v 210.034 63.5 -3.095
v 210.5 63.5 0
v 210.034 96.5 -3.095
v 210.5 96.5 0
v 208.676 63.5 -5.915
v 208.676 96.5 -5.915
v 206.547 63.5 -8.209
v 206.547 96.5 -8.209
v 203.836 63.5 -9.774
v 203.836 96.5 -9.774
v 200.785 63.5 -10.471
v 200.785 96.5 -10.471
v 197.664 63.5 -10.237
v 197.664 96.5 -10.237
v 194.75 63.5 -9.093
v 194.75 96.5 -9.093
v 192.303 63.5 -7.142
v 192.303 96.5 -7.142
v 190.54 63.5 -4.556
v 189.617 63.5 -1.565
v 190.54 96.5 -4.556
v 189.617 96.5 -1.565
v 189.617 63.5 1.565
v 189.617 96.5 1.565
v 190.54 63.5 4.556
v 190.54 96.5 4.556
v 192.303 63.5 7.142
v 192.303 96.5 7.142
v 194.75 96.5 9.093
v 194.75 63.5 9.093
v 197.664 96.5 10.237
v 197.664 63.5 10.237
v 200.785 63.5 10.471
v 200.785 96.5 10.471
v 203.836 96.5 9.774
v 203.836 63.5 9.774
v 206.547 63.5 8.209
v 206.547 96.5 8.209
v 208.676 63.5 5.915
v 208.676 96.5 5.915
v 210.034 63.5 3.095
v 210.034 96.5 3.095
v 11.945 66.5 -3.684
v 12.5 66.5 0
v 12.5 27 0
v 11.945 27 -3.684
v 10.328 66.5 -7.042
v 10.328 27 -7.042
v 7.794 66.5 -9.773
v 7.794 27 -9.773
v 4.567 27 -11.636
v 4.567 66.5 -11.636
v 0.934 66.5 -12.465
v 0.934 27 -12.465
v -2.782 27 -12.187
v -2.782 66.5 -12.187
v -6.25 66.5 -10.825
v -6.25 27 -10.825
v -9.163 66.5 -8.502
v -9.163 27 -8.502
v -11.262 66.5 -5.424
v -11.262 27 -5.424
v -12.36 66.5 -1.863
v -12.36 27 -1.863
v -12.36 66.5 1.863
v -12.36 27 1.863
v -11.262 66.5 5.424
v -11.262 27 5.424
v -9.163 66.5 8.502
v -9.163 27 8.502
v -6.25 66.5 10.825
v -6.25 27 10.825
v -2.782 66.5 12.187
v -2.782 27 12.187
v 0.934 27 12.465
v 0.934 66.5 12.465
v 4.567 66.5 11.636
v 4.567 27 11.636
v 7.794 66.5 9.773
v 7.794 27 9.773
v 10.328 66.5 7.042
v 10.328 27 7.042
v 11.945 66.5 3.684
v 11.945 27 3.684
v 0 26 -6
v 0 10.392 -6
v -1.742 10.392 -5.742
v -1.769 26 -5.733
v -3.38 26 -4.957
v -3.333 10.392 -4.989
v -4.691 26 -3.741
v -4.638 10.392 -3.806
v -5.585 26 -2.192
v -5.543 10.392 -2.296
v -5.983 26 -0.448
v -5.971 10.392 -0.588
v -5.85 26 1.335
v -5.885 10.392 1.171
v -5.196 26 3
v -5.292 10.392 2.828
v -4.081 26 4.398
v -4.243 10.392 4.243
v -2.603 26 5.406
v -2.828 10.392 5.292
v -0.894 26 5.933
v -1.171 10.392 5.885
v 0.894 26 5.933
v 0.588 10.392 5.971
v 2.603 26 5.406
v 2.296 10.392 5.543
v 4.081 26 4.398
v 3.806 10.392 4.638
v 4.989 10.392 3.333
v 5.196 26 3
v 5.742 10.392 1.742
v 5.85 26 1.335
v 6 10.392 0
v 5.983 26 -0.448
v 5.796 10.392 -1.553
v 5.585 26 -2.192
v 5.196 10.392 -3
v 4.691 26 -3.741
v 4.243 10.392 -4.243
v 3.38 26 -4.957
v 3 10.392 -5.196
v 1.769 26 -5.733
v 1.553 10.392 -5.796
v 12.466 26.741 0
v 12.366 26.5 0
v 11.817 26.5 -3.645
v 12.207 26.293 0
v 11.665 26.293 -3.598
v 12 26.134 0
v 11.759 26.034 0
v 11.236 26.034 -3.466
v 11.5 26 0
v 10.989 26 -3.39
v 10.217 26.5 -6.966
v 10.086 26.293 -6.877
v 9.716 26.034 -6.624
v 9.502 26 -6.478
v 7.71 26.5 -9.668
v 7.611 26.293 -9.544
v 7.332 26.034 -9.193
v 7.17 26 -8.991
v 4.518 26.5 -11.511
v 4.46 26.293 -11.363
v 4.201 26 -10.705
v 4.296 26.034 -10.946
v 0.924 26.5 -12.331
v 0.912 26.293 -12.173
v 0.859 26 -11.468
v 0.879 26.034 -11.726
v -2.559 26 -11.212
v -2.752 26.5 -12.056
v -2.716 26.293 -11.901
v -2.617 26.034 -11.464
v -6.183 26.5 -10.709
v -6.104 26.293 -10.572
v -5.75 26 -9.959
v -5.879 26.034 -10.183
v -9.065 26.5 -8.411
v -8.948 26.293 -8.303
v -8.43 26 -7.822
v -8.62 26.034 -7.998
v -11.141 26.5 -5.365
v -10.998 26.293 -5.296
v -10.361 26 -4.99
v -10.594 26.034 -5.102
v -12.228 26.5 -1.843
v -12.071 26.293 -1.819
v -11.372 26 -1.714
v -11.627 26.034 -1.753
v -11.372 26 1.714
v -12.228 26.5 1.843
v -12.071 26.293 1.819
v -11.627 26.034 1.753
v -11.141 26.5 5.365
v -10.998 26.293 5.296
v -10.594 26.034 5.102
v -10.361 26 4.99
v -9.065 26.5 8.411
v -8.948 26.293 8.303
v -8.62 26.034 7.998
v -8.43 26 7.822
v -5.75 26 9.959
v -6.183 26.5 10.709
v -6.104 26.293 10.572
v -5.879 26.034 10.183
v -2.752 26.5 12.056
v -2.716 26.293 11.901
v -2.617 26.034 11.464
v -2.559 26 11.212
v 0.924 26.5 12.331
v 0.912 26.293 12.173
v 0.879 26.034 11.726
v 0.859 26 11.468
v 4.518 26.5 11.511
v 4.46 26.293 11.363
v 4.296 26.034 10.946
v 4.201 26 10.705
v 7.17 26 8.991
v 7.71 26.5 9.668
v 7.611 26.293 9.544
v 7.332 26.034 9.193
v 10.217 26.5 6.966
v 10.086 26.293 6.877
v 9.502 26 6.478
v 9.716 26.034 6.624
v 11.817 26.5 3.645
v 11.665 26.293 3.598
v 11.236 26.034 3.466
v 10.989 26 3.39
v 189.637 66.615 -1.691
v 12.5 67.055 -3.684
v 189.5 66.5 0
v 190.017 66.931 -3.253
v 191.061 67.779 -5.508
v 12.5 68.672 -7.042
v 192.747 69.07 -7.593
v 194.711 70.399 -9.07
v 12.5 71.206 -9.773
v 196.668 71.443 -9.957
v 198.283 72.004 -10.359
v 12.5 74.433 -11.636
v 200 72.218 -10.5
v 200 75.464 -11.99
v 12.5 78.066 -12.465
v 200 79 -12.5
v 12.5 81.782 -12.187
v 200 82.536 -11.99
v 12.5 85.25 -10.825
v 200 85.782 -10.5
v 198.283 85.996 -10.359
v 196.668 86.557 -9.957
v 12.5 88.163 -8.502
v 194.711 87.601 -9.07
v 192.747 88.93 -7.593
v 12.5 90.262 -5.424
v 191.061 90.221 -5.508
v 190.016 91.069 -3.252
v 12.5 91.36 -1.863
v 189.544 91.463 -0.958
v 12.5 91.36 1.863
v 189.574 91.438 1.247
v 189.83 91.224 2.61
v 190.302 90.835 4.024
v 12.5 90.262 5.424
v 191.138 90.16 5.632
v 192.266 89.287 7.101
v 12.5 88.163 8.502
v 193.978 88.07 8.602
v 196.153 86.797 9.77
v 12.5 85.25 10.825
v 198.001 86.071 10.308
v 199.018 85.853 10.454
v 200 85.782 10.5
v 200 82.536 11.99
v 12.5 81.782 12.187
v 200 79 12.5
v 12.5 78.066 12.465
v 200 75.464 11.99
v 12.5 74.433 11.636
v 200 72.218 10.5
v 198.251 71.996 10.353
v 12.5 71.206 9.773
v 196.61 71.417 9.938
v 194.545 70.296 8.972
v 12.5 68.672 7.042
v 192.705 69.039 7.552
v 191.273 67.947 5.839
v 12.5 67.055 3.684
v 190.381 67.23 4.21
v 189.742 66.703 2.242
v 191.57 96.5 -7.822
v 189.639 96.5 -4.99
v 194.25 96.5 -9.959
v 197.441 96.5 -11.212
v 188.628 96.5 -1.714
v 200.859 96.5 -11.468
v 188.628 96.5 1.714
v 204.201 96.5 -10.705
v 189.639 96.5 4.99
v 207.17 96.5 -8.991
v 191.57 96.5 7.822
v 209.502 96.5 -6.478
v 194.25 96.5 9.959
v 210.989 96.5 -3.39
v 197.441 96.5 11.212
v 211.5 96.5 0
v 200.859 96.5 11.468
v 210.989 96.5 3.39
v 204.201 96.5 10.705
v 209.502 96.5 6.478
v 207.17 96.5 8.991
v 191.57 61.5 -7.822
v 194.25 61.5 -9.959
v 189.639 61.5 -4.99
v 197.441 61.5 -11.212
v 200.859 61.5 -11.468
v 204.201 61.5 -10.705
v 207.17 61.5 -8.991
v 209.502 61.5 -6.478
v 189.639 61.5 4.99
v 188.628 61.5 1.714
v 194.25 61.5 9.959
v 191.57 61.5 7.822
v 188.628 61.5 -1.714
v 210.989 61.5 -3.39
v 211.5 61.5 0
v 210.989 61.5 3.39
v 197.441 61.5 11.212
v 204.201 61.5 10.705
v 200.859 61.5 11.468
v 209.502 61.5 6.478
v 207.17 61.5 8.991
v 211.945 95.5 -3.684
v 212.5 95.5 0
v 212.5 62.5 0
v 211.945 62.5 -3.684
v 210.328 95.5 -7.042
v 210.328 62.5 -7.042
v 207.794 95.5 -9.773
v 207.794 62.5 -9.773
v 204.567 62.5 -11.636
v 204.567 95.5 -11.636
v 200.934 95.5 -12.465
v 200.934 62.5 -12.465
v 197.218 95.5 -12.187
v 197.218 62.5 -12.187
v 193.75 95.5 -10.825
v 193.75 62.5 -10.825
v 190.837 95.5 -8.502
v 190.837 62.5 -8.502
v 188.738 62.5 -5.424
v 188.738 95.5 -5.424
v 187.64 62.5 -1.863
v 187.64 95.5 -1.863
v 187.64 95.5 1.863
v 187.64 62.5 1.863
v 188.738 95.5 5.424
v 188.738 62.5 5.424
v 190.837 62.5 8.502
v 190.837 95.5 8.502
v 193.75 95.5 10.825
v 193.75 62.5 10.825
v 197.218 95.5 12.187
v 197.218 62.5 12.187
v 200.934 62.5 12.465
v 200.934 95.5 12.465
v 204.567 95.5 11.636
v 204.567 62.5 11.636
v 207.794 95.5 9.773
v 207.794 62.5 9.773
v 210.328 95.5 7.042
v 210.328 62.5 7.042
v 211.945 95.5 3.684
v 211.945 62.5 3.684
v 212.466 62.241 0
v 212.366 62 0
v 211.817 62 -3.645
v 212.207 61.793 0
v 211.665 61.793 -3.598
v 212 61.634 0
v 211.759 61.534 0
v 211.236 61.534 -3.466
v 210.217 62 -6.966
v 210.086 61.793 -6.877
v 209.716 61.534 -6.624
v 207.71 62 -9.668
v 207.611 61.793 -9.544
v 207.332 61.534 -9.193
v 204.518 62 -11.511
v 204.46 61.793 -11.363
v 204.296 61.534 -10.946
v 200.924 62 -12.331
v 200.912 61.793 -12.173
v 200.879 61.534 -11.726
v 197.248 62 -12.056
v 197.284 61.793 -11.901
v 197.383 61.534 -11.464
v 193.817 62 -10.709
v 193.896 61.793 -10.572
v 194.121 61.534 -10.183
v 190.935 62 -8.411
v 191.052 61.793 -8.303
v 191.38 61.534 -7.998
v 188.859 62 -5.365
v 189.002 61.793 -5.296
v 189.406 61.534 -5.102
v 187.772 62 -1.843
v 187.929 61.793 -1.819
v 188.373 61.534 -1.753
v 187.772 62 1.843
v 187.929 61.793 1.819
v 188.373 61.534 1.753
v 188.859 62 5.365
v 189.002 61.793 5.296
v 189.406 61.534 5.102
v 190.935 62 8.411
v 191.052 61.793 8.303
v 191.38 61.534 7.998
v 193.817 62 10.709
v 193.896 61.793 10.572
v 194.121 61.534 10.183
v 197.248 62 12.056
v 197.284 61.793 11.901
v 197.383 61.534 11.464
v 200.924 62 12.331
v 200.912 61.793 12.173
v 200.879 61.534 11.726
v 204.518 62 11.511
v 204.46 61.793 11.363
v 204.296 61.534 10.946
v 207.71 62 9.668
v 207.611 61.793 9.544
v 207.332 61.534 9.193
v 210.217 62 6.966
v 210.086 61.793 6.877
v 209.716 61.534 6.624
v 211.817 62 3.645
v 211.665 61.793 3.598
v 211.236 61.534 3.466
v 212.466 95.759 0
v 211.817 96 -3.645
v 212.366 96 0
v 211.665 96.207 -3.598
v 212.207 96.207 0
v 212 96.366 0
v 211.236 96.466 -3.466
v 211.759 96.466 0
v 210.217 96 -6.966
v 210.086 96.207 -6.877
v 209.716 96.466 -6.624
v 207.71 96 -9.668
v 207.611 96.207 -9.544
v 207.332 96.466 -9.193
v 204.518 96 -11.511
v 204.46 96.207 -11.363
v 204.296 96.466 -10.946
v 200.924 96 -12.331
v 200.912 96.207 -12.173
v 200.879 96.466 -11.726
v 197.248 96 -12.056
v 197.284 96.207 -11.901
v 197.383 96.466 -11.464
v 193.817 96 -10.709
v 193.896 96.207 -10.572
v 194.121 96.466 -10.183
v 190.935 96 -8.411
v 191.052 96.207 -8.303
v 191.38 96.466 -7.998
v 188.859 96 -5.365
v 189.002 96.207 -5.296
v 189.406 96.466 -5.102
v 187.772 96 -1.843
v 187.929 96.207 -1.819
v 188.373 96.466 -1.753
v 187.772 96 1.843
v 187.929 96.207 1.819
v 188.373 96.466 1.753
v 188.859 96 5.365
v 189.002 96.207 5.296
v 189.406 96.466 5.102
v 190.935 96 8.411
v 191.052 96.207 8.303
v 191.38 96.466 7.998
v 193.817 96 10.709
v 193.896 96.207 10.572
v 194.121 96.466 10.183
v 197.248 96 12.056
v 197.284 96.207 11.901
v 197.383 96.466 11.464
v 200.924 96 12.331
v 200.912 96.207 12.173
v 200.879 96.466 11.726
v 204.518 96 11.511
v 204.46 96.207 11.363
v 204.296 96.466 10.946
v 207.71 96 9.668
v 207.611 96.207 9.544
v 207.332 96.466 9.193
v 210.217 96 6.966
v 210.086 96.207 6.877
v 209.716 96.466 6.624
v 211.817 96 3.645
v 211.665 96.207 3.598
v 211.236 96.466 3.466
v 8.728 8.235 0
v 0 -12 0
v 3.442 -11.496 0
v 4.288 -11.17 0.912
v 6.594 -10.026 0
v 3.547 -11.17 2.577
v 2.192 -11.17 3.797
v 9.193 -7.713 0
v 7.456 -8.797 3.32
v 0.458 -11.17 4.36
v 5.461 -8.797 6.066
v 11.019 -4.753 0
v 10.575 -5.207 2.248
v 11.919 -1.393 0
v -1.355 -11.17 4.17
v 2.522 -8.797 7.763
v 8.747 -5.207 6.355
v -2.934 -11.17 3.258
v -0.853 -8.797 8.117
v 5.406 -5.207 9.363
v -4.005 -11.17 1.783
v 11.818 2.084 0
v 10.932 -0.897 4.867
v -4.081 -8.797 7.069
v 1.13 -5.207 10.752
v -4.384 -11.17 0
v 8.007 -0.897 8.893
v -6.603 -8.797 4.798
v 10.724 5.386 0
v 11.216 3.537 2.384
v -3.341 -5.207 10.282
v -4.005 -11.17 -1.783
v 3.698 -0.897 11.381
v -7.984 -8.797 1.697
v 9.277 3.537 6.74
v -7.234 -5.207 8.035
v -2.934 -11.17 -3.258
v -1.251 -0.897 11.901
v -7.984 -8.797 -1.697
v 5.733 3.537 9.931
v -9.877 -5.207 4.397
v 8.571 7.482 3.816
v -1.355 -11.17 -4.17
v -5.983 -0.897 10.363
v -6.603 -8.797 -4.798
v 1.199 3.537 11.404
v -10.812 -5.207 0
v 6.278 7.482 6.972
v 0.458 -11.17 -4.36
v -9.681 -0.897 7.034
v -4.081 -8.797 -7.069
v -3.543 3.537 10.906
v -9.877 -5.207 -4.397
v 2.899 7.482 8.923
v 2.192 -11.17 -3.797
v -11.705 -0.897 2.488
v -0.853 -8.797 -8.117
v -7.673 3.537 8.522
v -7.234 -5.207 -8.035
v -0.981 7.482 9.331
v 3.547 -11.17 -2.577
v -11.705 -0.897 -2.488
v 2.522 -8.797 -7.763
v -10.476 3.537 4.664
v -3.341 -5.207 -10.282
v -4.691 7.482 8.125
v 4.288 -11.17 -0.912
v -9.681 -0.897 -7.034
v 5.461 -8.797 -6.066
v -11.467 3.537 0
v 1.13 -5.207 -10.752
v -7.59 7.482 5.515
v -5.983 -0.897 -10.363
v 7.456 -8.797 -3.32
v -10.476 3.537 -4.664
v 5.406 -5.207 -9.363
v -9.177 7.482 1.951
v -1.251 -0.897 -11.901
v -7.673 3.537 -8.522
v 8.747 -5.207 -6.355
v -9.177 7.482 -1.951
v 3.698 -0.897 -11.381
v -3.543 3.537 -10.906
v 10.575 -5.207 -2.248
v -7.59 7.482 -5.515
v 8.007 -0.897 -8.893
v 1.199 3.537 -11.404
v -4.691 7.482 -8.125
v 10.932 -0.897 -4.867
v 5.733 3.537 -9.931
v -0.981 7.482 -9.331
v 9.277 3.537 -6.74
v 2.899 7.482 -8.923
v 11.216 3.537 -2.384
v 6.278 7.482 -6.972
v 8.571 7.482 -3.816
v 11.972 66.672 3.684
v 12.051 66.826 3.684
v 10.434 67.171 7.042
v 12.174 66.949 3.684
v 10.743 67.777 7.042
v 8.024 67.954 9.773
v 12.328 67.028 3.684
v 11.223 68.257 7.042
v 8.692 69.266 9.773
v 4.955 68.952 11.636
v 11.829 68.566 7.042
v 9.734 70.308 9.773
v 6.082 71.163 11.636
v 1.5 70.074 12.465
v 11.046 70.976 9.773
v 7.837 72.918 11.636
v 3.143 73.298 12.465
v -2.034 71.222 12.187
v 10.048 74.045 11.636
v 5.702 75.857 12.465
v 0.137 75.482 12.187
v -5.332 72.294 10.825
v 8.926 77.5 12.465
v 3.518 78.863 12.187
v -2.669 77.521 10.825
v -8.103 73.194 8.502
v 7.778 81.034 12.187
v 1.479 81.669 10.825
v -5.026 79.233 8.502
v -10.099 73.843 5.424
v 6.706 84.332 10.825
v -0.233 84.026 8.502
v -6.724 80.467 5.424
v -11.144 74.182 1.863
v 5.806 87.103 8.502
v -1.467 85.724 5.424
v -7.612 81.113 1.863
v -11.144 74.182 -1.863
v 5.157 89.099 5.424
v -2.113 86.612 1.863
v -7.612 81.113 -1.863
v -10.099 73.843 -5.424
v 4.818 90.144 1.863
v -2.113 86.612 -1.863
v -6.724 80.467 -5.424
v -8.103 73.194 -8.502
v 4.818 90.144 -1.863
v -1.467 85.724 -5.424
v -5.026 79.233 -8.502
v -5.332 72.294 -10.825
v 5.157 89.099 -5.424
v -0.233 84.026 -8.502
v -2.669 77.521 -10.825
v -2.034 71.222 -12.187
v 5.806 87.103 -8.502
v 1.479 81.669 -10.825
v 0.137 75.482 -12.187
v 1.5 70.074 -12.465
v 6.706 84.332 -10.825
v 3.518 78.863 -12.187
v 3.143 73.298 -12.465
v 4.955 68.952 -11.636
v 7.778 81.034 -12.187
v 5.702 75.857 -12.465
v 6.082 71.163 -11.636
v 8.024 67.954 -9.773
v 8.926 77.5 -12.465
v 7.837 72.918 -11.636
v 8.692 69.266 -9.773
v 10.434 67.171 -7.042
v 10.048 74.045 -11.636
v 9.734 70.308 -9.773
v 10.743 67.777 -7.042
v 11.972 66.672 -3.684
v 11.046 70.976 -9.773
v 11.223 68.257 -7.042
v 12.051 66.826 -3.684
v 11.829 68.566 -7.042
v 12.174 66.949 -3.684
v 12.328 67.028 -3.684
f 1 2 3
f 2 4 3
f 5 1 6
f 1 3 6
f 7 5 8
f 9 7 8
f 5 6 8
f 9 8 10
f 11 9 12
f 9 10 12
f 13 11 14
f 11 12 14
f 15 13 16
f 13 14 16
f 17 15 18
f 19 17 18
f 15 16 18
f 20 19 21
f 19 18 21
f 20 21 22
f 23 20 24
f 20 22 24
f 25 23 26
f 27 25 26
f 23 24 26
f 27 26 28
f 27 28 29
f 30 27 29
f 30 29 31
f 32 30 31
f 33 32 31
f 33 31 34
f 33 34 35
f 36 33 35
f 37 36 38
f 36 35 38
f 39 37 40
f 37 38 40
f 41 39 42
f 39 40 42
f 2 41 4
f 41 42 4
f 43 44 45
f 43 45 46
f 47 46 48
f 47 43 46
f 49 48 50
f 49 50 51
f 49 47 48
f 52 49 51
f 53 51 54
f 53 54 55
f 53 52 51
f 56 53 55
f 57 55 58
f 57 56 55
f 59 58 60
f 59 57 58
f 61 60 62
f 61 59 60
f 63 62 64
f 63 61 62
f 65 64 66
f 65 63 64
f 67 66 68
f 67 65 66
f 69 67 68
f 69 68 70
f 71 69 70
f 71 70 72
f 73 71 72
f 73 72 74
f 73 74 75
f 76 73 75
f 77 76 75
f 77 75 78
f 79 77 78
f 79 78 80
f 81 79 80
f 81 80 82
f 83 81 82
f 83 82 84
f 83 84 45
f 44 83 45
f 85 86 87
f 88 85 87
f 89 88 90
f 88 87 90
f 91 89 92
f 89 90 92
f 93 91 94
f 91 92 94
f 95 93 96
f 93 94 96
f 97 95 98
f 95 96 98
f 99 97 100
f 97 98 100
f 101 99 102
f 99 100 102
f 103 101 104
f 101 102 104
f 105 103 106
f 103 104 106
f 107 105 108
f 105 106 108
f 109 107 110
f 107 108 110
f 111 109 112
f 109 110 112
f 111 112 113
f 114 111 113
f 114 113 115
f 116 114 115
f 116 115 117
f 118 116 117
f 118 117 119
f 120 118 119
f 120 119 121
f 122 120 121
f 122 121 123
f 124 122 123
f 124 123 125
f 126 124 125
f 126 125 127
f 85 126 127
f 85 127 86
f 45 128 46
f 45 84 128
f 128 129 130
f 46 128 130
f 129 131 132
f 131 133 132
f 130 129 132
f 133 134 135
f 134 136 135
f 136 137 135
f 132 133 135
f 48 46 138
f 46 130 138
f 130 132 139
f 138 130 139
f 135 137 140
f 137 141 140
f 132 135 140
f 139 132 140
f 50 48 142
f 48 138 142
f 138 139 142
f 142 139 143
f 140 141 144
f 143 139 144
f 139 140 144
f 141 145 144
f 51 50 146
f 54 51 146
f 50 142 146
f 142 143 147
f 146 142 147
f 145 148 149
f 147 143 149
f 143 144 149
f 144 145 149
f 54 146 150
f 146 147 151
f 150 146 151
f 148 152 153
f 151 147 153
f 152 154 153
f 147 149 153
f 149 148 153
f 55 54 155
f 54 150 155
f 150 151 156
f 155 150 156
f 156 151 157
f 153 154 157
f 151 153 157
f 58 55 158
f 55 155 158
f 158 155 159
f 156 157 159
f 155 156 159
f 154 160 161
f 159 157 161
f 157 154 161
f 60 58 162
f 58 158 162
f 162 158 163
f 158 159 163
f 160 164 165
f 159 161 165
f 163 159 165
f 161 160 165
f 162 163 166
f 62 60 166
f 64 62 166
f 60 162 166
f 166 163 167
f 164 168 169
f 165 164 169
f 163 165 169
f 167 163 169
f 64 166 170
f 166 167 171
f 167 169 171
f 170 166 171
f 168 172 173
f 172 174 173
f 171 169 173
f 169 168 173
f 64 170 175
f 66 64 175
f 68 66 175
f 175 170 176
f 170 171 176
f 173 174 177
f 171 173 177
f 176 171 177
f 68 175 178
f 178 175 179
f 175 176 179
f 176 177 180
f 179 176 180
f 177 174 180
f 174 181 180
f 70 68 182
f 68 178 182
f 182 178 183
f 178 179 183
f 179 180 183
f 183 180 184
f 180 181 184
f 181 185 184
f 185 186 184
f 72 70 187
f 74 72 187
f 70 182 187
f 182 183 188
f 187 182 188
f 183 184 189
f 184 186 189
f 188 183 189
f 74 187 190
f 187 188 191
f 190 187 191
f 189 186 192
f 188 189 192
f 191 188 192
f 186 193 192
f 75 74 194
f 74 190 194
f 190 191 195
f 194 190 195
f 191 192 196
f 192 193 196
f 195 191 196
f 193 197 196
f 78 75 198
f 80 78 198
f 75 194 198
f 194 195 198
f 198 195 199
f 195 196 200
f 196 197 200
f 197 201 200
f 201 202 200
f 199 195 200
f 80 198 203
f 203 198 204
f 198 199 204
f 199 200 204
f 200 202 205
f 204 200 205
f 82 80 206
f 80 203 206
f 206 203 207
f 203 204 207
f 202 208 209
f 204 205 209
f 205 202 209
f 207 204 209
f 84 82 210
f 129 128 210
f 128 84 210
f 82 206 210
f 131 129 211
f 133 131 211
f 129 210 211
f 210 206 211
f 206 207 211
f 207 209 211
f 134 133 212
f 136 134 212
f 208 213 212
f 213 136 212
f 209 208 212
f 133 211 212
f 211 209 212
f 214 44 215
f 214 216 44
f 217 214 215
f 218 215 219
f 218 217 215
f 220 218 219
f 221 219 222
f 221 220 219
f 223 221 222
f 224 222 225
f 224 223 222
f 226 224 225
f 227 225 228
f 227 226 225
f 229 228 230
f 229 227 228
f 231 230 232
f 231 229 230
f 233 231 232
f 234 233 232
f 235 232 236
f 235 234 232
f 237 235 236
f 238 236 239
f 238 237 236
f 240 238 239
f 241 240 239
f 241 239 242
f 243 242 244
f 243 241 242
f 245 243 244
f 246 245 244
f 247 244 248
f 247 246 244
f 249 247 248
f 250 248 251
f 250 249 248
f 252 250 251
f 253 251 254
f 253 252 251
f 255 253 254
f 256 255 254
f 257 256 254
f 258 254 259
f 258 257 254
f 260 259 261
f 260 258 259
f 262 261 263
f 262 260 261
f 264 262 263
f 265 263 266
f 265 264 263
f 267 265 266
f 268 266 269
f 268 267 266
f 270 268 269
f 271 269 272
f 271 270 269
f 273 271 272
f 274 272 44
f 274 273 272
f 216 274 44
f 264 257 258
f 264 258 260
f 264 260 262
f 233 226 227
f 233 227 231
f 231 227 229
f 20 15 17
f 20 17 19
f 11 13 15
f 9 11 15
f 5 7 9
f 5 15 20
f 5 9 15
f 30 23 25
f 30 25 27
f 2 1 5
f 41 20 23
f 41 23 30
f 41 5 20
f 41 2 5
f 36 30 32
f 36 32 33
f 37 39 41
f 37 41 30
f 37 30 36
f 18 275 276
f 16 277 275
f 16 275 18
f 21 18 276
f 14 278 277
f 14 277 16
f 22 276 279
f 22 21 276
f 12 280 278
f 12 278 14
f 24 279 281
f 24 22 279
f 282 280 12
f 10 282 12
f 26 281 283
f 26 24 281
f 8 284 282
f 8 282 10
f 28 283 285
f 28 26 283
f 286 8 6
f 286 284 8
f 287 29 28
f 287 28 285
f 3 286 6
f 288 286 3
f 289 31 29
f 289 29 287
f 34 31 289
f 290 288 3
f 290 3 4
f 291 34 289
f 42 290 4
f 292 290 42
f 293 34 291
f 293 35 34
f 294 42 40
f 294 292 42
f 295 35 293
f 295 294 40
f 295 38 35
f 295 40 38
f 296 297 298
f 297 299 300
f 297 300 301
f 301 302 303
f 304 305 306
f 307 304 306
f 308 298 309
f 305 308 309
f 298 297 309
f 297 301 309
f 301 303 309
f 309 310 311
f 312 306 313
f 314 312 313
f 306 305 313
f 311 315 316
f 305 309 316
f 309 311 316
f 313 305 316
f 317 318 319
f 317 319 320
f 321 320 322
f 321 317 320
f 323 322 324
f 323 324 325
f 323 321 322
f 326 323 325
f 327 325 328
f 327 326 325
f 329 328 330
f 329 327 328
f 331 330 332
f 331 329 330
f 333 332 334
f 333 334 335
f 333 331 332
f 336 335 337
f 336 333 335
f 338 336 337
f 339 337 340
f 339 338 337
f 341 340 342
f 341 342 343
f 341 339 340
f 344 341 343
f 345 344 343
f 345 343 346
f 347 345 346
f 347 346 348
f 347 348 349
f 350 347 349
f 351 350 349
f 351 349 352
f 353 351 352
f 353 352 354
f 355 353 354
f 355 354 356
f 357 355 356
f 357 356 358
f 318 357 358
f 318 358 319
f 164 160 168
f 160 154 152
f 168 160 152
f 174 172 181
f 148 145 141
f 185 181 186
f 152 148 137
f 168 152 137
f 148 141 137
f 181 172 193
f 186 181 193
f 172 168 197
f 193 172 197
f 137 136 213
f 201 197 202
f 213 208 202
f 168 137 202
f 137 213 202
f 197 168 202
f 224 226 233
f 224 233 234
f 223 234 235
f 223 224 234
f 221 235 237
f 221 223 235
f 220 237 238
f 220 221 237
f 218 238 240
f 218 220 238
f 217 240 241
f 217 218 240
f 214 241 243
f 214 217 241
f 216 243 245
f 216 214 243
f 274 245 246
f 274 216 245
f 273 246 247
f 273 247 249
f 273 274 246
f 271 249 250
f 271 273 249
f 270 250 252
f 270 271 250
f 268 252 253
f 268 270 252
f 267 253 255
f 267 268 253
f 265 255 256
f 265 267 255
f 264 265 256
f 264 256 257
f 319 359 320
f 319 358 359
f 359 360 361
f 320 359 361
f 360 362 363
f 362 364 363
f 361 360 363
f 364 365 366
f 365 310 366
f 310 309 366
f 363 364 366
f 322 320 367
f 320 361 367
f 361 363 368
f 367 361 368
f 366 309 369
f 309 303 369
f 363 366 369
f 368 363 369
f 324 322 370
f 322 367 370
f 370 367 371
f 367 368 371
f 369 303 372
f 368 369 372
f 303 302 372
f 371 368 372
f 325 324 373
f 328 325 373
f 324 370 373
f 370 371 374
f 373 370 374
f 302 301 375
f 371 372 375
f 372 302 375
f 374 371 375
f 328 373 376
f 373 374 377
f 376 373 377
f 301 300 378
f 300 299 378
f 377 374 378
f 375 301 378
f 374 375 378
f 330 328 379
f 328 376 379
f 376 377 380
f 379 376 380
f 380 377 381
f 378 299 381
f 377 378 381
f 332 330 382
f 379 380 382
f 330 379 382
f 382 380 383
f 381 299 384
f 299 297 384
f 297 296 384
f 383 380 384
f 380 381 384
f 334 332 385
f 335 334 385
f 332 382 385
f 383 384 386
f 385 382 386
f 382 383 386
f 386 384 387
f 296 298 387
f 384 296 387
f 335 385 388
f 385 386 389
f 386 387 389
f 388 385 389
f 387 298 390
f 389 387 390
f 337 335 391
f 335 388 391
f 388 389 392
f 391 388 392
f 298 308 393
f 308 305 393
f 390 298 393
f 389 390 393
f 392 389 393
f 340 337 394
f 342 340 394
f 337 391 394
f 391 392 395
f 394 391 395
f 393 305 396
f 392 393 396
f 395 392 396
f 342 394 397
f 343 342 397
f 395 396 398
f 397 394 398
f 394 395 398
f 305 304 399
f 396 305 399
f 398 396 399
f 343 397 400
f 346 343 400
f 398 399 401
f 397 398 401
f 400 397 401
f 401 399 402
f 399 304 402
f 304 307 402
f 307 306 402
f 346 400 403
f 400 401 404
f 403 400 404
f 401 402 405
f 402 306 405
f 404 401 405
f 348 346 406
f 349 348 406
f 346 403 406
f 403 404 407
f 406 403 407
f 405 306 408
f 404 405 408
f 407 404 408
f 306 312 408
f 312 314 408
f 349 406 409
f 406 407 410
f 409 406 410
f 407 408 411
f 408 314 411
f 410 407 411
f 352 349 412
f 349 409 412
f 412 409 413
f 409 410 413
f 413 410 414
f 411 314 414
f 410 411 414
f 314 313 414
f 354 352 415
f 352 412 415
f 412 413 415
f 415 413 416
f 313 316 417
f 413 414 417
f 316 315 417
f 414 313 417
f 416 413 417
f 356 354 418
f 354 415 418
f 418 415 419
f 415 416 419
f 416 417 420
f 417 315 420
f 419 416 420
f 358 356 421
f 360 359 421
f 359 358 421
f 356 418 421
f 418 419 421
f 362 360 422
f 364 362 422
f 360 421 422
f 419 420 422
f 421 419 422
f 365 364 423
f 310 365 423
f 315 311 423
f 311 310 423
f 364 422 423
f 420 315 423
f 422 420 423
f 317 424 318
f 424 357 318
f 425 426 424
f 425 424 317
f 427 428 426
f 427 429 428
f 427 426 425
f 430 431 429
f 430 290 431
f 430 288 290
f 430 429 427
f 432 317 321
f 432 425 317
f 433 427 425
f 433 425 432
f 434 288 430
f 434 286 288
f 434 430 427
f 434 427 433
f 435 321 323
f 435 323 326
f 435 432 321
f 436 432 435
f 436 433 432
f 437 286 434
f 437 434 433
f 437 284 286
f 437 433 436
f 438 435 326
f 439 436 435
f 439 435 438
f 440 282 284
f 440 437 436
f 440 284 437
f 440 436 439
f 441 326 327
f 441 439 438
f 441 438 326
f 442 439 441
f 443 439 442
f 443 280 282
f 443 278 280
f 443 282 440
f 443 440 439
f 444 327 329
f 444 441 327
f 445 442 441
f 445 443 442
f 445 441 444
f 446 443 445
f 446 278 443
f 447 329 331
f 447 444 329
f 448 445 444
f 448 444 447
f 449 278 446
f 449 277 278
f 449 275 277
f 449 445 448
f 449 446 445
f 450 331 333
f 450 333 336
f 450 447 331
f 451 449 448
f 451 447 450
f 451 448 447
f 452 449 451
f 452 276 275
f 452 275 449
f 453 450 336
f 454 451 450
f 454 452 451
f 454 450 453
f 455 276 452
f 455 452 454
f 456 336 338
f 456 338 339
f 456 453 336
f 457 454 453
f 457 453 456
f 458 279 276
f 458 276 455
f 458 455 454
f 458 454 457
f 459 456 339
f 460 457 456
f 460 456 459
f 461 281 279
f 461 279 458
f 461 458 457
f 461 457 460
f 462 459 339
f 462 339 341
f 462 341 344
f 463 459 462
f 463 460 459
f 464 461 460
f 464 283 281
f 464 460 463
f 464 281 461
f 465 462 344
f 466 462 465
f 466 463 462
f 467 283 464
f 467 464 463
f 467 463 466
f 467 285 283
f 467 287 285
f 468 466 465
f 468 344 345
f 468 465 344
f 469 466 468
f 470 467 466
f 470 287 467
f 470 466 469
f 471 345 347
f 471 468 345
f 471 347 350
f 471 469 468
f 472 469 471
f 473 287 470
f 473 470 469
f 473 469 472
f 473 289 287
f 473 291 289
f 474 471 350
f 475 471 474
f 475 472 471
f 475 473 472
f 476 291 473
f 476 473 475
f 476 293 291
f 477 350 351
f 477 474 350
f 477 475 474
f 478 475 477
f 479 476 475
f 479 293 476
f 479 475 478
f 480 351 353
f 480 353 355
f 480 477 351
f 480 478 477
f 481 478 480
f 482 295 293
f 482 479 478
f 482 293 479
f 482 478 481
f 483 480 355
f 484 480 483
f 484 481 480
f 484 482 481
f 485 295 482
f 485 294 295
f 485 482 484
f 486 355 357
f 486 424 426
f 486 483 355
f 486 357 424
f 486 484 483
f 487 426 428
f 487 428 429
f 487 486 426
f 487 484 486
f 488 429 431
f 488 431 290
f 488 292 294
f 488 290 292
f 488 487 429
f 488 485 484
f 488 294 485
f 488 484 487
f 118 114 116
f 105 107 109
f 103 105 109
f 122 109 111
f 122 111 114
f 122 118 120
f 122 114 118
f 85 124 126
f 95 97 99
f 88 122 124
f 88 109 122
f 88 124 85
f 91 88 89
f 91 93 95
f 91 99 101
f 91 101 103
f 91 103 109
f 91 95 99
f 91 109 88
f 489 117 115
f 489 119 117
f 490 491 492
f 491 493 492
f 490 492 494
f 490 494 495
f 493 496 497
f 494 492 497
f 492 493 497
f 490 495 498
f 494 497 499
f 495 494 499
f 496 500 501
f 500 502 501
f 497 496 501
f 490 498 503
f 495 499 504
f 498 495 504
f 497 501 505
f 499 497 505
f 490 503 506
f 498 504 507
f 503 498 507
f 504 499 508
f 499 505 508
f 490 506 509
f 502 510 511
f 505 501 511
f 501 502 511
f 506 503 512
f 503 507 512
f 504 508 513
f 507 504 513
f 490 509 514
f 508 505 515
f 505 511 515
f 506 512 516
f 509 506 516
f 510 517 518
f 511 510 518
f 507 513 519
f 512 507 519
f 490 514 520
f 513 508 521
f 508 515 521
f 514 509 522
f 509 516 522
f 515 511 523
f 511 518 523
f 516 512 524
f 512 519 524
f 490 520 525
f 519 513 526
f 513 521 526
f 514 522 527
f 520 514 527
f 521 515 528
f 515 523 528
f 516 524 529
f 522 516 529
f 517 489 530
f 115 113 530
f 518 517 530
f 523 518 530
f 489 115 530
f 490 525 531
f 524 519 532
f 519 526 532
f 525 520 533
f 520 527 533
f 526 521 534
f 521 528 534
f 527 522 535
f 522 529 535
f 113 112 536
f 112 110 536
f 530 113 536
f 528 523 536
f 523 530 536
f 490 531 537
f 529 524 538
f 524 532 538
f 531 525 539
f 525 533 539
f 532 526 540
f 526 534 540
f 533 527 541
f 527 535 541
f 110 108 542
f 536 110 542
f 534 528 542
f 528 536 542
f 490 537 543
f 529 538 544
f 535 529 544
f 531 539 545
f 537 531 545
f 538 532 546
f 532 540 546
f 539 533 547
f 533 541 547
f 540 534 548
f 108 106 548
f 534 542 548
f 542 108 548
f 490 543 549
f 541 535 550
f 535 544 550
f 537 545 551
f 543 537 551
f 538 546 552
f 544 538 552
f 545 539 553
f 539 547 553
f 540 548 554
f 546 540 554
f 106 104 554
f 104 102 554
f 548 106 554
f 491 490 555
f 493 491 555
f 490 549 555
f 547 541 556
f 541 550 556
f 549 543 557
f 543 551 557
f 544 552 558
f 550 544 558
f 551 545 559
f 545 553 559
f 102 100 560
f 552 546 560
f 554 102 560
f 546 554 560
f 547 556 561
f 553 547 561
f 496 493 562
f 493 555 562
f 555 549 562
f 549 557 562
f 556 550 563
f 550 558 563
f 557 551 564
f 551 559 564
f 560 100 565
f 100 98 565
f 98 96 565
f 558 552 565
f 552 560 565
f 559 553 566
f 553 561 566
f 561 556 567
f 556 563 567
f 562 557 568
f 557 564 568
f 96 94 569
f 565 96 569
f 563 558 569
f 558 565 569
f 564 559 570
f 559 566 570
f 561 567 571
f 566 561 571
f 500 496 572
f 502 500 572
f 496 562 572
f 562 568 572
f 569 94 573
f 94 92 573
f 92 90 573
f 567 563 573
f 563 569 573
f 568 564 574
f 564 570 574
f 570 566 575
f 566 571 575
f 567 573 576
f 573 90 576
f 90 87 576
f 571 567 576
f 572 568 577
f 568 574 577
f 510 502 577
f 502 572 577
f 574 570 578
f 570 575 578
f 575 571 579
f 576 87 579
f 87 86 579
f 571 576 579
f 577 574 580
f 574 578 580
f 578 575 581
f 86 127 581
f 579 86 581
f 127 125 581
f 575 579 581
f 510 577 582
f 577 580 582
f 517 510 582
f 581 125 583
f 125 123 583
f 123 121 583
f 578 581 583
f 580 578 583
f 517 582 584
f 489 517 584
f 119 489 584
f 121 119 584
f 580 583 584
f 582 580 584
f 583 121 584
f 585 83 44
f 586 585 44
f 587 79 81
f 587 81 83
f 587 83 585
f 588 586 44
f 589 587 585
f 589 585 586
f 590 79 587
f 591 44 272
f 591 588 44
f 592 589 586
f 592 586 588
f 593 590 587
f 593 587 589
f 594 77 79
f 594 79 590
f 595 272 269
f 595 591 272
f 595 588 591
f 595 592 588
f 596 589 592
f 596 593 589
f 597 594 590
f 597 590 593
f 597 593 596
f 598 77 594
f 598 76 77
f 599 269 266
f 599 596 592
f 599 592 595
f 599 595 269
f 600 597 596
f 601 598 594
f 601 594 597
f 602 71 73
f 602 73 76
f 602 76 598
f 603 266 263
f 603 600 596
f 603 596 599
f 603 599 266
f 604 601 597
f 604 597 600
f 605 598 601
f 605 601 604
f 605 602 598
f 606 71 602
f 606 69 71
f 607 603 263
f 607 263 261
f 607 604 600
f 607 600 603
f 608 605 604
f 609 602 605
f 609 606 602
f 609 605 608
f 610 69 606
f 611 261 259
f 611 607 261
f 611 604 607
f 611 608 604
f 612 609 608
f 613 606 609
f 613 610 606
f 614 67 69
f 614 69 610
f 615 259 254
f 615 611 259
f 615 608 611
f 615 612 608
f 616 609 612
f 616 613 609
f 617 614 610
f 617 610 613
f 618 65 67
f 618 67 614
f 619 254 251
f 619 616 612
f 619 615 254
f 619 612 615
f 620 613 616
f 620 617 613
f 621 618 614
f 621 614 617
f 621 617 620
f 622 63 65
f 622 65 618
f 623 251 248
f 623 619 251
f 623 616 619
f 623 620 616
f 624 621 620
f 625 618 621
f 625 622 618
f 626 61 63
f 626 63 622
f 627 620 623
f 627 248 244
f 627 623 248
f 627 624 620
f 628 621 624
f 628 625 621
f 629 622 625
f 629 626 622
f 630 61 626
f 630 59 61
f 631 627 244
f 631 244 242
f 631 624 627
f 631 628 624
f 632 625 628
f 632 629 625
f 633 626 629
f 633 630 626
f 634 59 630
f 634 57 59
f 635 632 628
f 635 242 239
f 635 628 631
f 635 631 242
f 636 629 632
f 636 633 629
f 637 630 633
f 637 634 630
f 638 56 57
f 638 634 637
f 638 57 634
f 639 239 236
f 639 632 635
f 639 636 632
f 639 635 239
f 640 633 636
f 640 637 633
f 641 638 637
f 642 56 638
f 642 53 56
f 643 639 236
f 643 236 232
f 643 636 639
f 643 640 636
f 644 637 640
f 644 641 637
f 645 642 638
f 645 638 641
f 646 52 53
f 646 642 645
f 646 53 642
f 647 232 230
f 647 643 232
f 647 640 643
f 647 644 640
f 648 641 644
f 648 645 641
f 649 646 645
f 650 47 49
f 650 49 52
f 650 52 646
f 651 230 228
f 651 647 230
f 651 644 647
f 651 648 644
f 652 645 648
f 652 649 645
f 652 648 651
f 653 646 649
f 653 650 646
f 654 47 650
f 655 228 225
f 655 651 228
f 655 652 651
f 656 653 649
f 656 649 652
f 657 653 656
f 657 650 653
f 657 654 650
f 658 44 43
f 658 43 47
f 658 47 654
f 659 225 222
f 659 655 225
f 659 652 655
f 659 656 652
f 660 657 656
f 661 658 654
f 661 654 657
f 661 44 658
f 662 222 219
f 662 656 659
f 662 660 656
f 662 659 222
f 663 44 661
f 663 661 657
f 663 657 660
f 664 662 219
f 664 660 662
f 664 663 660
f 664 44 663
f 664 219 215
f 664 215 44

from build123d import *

# Parameters (mm, degrees)
SKETCH_2_R          = 6
EXTRUDE_1_DEPTH     = 26
SKETCH_3_R          = 12.5
SKETCH_6_R          = 12.5
SHELL_1_T           = -2
SKETCH_7_R          = 10.5
CUT_EXTRUDE_1_DEPTH = 226.860023029
FILLET_1_R          = 1
FILLET_2_R          = 1


with BuildPart() as part:
    # 草圖1 → 旋轉1 (revolve)
    with BuildSketch(Plane.XY):
        with BuildLine():
            Line((0, 12), (0, -12))
            ThreePointArc((0, -12), (12, 0), (0, 12))
        make_face()
    revolve(axis=Axis((0, 12, 0), (0, -1, 0)))

    # 草圖2 → 填料-伸長1 (add)
    with BuildSketch(Plane(origin=(0, 0, 0), x_dir=(1, 0, 0), z_dir=(0, 1, 0))):
        with Locations(Location((0, 0, 0), (0, 0, 90))):
            Circle(SKETCH_2_R)
    extrude(amount=EXTRUDE_1_DEPTH)


with BuildPart() as body_2:
    # 掃出1: sweep along a path in 草圖4
    with BuildLine(Plane.XY) as sweep_1_path:
        Line((0, 26), (0, 66.5))
        ThreePointArc((0, 66.5), (3.661165235, 75.338834765), (12.5, 79))
        Line((12.5, 79), (200, 79))
    # 草圖3 → 掃出1 (sweep)
    with BuildSketch(Plane(origin=(0, 26, 0), x_dir=(1, 0, 0), z_dir=(0, 1, 0))):
        Circle(SKETCH_3_R)
    sweep(path=sweep_1_path.line)

    # 草圖7 → 除料-伸長1 (cut, through all)
    with BuildSketch(Plane(origin=(0, 63.5, 0), x_dir=(1, 0, 0), z_dir=(0, 1, 0))):
        with Locations(Location((200, 0, 0), (0, 0, 270))):
            Circle(SKETCH_7_R)
    extrude(amount=CUT_EXTRUDE_1_DEPTH, mode=Mode.SUBTRACT)

    # 圓角1
    fillet_1_edges = [body_2.edges().sort_by_distance(p)[0] for p in [
        (-12.5, 26, 0),
    ]]
    fillet(fillet_1_edges, radius=FILLET_1_R)


with BuildPart() as body_3:
    # 掃出2: sweep along a path in 草圖5
    with BuildLine(Plane.XY) as sweep_2_path:
        Line((200, 61.5), (200, 79))
        Line((200, 79), (200, 96.5))
    # 草圖6 → 掃出2 (sweep)
    with BuildSketch(Plane(origin=(0, 96.5, 0), x_dir=(1, 0, 0), z_dir=(0, 1, 0))):
        with Locations((200, 0)):
            Circle(SKETCH_6_R)
    sweep(path=sweep_2_path.line)

    # 薄殼1
    shell_1_openings = [body_3.faces().sort_by_distance(p)[0] for p in [
        (200, 96.5, 0),
    ]]
    offset(amount=SHELL_1_T, openings=shell_1_openings, kind=Kind.INTERSECTION)

    # 圓角2
    fillet_2_edges = [body_3.edges().sort_by_distance(p)[0] for p in [
        (187.5, 96.5, 0),
        (187.5, 61.5, 0),
    ]]
    fillet(fillet_2_edges, radius=FILLET_2_R)


solid = Compound([part.part, body_2.part, body_3.part])
